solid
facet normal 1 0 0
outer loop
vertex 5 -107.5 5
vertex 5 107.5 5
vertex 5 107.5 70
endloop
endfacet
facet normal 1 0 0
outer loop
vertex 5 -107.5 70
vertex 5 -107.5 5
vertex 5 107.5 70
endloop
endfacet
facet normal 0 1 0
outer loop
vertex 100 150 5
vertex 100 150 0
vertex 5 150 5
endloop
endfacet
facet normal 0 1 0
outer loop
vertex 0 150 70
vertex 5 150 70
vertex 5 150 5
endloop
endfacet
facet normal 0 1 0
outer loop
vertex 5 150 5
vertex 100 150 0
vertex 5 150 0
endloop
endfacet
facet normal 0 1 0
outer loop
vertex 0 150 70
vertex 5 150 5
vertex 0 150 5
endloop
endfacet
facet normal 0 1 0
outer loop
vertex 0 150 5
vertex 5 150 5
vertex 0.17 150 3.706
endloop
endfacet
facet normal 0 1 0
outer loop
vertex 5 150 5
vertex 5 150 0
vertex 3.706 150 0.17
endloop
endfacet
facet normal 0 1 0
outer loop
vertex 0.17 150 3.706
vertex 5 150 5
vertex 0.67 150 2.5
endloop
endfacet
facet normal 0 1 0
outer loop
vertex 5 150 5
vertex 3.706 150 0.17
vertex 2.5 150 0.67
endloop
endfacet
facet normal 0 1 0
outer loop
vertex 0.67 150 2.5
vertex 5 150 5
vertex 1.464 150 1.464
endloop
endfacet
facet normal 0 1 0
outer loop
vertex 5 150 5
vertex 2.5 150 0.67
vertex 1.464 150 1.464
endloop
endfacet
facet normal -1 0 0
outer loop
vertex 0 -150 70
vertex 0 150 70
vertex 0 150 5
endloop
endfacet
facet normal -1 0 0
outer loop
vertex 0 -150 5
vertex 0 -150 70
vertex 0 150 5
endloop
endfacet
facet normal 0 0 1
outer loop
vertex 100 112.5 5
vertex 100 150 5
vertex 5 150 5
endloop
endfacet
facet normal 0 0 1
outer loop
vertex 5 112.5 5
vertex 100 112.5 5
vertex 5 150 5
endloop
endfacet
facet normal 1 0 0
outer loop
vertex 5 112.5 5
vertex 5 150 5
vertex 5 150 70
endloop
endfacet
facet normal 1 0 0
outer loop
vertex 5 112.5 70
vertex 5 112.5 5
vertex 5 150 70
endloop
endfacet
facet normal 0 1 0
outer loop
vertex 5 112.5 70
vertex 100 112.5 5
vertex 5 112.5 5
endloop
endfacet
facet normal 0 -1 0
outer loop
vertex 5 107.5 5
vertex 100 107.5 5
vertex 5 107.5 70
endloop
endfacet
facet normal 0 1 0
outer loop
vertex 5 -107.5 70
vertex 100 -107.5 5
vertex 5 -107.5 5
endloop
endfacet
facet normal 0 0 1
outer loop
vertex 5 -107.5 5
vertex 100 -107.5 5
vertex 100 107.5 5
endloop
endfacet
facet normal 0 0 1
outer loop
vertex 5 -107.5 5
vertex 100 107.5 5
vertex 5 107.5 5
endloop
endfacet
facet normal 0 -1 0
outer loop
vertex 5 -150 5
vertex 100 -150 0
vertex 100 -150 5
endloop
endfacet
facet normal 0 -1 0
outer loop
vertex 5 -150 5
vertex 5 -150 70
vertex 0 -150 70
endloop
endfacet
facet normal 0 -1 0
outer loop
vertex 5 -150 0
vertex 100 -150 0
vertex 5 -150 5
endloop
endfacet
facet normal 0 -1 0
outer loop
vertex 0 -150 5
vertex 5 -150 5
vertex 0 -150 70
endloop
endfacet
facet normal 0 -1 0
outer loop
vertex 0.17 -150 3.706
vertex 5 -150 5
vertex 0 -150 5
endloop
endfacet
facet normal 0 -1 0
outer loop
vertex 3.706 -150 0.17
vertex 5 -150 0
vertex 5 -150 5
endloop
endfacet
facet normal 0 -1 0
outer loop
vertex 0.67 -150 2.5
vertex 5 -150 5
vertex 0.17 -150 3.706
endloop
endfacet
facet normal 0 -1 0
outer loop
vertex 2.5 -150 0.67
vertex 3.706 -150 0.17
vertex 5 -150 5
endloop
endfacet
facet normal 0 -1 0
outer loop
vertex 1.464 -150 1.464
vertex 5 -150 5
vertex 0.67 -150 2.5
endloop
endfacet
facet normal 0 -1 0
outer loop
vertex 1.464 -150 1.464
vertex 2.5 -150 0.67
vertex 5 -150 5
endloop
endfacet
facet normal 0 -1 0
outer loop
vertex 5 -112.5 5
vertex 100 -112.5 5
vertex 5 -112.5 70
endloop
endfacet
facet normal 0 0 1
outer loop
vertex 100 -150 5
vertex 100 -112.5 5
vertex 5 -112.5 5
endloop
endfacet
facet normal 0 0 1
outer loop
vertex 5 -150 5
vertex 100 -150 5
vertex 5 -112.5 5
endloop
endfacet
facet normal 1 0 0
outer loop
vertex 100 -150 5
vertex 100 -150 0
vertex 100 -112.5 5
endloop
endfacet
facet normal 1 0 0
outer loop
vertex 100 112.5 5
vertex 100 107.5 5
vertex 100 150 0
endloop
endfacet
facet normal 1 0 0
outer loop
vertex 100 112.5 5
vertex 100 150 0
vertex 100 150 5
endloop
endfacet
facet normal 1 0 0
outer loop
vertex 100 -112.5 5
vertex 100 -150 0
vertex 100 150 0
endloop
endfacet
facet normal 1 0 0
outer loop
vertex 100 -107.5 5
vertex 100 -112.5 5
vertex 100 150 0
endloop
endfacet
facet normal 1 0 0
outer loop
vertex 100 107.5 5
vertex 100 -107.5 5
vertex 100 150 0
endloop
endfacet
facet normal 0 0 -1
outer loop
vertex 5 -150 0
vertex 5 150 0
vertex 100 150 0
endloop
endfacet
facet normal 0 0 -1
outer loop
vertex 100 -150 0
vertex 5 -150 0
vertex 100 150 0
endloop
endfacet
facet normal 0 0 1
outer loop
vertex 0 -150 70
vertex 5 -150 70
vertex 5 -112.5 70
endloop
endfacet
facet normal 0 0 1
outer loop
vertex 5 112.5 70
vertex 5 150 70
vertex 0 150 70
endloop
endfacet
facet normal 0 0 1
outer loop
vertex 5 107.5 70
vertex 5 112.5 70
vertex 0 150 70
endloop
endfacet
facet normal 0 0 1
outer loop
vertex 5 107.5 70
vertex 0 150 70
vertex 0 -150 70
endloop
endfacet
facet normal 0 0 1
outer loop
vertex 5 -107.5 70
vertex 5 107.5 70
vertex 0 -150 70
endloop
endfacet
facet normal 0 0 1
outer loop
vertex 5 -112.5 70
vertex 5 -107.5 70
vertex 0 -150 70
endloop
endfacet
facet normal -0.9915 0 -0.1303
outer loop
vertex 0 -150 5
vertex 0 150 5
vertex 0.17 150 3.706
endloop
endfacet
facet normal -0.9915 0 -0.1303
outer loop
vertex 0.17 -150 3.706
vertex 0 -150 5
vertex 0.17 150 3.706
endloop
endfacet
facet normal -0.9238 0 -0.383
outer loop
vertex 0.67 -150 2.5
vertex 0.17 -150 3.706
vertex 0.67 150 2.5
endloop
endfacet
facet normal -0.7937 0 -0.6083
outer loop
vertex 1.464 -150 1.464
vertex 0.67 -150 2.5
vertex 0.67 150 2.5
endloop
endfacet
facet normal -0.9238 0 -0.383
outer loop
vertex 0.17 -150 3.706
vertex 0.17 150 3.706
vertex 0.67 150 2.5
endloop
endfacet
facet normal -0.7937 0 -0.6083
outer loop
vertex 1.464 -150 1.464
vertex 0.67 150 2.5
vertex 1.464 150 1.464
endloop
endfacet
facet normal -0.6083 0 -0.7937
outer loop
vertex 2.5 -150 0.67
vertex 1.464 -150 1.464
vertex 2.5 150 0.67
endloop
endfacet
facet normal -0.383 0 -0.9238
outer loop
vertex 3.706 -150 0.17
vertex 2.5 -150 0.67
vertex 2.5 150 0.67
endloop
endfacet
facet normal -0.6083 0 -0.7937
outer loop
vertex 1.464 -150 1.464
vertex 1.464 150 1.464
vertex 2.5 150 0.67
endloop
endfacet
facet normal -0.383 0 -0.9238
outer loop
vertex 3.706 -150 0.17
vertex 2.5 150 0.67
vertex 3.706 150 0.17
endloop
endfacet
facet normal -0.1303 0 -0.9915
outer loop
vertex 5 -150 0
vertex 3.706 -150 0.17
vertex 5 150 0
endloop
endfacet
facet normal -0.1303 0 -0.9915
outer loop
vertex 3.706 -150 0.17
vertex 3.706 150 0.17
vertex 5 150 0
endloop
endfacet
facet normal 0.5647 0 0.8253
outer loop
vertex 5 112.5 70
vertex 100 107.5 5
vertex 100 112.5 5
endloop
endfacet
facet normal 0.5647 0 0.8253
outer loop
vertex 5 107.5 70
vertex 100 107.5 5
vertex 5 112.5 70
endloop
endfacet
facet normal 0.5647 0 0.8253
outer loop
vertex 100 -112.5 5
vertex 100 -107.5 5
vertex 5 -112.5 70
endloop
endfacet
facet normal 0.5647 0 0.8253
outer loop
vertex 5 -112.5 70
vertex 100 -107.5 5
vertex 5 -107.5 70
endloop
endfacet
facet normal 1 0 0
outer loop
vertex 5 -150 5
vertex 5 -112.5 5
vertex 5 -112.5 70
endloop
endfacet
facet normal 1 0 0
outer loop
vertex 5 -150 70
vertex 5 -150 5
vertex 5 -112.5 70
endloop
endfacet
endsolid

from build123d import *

# Parameters (mm, degrees)
SALIENTE_EXTRUIR1_DEPTH = 150
NERVIO1_REACH           = 289.228
CROQUIS2_WALL_W         = 691.564908986
CROQUIS2_WALL_H         = 5


with BuildPart() as part:
    # Croquis1 → Saliente-Extruir1 (new, symmetric)
    with BuildSketch(Plane(origin=(0, 0, 0), x_dir=(1, 0, 0), z_dir=(0, 1, 0))):
        with BuildLine():
            Line((5, 0), (100, 0))
            Line((100, 0), (100, -5))
            Line((100, -5), (5, -5))
            Line((5, -5), (5, -70))
            Line((5, -70), (0, -70))
            Line((0, -70), (0, -5))
            ThreePointArc((0, -5), (1.464466094, -1.464466094), (5, 0))
        make_face()
    extrude(amount=SALIENTE_EXTRUIR1_DEPTH, both=True)

    # Croquis2 wall → Nervio1 (add, up to next)
    with BuildSketch(Plane(origin=(52.5, 110, 37.5), x_dir=(-0.82530726125, 0, 0.564683915592), z_dir=(0.564683915592, 0, 0.82530726125)), mode=Mode.PRIVATE) as nervio1_sk1:
        Rectangle(CROQUIS2_WALL_W, CROQUIS2_WALL_H)
    nervio1_tool1 = extrude(nervio1_sk1.sketch, amount=-NERVIO1_REACH, mode=Mode.PRIVATE) - part.part
    nervio1 = nervio1_tool1.solids().sort_by_distance((52.5, 110, 37.5))[0]
    add(nervio1)

    # Simetría1: Nervio1 across plane
    add(nervio1.mirror(Plane.ZX))


solid = part.part
